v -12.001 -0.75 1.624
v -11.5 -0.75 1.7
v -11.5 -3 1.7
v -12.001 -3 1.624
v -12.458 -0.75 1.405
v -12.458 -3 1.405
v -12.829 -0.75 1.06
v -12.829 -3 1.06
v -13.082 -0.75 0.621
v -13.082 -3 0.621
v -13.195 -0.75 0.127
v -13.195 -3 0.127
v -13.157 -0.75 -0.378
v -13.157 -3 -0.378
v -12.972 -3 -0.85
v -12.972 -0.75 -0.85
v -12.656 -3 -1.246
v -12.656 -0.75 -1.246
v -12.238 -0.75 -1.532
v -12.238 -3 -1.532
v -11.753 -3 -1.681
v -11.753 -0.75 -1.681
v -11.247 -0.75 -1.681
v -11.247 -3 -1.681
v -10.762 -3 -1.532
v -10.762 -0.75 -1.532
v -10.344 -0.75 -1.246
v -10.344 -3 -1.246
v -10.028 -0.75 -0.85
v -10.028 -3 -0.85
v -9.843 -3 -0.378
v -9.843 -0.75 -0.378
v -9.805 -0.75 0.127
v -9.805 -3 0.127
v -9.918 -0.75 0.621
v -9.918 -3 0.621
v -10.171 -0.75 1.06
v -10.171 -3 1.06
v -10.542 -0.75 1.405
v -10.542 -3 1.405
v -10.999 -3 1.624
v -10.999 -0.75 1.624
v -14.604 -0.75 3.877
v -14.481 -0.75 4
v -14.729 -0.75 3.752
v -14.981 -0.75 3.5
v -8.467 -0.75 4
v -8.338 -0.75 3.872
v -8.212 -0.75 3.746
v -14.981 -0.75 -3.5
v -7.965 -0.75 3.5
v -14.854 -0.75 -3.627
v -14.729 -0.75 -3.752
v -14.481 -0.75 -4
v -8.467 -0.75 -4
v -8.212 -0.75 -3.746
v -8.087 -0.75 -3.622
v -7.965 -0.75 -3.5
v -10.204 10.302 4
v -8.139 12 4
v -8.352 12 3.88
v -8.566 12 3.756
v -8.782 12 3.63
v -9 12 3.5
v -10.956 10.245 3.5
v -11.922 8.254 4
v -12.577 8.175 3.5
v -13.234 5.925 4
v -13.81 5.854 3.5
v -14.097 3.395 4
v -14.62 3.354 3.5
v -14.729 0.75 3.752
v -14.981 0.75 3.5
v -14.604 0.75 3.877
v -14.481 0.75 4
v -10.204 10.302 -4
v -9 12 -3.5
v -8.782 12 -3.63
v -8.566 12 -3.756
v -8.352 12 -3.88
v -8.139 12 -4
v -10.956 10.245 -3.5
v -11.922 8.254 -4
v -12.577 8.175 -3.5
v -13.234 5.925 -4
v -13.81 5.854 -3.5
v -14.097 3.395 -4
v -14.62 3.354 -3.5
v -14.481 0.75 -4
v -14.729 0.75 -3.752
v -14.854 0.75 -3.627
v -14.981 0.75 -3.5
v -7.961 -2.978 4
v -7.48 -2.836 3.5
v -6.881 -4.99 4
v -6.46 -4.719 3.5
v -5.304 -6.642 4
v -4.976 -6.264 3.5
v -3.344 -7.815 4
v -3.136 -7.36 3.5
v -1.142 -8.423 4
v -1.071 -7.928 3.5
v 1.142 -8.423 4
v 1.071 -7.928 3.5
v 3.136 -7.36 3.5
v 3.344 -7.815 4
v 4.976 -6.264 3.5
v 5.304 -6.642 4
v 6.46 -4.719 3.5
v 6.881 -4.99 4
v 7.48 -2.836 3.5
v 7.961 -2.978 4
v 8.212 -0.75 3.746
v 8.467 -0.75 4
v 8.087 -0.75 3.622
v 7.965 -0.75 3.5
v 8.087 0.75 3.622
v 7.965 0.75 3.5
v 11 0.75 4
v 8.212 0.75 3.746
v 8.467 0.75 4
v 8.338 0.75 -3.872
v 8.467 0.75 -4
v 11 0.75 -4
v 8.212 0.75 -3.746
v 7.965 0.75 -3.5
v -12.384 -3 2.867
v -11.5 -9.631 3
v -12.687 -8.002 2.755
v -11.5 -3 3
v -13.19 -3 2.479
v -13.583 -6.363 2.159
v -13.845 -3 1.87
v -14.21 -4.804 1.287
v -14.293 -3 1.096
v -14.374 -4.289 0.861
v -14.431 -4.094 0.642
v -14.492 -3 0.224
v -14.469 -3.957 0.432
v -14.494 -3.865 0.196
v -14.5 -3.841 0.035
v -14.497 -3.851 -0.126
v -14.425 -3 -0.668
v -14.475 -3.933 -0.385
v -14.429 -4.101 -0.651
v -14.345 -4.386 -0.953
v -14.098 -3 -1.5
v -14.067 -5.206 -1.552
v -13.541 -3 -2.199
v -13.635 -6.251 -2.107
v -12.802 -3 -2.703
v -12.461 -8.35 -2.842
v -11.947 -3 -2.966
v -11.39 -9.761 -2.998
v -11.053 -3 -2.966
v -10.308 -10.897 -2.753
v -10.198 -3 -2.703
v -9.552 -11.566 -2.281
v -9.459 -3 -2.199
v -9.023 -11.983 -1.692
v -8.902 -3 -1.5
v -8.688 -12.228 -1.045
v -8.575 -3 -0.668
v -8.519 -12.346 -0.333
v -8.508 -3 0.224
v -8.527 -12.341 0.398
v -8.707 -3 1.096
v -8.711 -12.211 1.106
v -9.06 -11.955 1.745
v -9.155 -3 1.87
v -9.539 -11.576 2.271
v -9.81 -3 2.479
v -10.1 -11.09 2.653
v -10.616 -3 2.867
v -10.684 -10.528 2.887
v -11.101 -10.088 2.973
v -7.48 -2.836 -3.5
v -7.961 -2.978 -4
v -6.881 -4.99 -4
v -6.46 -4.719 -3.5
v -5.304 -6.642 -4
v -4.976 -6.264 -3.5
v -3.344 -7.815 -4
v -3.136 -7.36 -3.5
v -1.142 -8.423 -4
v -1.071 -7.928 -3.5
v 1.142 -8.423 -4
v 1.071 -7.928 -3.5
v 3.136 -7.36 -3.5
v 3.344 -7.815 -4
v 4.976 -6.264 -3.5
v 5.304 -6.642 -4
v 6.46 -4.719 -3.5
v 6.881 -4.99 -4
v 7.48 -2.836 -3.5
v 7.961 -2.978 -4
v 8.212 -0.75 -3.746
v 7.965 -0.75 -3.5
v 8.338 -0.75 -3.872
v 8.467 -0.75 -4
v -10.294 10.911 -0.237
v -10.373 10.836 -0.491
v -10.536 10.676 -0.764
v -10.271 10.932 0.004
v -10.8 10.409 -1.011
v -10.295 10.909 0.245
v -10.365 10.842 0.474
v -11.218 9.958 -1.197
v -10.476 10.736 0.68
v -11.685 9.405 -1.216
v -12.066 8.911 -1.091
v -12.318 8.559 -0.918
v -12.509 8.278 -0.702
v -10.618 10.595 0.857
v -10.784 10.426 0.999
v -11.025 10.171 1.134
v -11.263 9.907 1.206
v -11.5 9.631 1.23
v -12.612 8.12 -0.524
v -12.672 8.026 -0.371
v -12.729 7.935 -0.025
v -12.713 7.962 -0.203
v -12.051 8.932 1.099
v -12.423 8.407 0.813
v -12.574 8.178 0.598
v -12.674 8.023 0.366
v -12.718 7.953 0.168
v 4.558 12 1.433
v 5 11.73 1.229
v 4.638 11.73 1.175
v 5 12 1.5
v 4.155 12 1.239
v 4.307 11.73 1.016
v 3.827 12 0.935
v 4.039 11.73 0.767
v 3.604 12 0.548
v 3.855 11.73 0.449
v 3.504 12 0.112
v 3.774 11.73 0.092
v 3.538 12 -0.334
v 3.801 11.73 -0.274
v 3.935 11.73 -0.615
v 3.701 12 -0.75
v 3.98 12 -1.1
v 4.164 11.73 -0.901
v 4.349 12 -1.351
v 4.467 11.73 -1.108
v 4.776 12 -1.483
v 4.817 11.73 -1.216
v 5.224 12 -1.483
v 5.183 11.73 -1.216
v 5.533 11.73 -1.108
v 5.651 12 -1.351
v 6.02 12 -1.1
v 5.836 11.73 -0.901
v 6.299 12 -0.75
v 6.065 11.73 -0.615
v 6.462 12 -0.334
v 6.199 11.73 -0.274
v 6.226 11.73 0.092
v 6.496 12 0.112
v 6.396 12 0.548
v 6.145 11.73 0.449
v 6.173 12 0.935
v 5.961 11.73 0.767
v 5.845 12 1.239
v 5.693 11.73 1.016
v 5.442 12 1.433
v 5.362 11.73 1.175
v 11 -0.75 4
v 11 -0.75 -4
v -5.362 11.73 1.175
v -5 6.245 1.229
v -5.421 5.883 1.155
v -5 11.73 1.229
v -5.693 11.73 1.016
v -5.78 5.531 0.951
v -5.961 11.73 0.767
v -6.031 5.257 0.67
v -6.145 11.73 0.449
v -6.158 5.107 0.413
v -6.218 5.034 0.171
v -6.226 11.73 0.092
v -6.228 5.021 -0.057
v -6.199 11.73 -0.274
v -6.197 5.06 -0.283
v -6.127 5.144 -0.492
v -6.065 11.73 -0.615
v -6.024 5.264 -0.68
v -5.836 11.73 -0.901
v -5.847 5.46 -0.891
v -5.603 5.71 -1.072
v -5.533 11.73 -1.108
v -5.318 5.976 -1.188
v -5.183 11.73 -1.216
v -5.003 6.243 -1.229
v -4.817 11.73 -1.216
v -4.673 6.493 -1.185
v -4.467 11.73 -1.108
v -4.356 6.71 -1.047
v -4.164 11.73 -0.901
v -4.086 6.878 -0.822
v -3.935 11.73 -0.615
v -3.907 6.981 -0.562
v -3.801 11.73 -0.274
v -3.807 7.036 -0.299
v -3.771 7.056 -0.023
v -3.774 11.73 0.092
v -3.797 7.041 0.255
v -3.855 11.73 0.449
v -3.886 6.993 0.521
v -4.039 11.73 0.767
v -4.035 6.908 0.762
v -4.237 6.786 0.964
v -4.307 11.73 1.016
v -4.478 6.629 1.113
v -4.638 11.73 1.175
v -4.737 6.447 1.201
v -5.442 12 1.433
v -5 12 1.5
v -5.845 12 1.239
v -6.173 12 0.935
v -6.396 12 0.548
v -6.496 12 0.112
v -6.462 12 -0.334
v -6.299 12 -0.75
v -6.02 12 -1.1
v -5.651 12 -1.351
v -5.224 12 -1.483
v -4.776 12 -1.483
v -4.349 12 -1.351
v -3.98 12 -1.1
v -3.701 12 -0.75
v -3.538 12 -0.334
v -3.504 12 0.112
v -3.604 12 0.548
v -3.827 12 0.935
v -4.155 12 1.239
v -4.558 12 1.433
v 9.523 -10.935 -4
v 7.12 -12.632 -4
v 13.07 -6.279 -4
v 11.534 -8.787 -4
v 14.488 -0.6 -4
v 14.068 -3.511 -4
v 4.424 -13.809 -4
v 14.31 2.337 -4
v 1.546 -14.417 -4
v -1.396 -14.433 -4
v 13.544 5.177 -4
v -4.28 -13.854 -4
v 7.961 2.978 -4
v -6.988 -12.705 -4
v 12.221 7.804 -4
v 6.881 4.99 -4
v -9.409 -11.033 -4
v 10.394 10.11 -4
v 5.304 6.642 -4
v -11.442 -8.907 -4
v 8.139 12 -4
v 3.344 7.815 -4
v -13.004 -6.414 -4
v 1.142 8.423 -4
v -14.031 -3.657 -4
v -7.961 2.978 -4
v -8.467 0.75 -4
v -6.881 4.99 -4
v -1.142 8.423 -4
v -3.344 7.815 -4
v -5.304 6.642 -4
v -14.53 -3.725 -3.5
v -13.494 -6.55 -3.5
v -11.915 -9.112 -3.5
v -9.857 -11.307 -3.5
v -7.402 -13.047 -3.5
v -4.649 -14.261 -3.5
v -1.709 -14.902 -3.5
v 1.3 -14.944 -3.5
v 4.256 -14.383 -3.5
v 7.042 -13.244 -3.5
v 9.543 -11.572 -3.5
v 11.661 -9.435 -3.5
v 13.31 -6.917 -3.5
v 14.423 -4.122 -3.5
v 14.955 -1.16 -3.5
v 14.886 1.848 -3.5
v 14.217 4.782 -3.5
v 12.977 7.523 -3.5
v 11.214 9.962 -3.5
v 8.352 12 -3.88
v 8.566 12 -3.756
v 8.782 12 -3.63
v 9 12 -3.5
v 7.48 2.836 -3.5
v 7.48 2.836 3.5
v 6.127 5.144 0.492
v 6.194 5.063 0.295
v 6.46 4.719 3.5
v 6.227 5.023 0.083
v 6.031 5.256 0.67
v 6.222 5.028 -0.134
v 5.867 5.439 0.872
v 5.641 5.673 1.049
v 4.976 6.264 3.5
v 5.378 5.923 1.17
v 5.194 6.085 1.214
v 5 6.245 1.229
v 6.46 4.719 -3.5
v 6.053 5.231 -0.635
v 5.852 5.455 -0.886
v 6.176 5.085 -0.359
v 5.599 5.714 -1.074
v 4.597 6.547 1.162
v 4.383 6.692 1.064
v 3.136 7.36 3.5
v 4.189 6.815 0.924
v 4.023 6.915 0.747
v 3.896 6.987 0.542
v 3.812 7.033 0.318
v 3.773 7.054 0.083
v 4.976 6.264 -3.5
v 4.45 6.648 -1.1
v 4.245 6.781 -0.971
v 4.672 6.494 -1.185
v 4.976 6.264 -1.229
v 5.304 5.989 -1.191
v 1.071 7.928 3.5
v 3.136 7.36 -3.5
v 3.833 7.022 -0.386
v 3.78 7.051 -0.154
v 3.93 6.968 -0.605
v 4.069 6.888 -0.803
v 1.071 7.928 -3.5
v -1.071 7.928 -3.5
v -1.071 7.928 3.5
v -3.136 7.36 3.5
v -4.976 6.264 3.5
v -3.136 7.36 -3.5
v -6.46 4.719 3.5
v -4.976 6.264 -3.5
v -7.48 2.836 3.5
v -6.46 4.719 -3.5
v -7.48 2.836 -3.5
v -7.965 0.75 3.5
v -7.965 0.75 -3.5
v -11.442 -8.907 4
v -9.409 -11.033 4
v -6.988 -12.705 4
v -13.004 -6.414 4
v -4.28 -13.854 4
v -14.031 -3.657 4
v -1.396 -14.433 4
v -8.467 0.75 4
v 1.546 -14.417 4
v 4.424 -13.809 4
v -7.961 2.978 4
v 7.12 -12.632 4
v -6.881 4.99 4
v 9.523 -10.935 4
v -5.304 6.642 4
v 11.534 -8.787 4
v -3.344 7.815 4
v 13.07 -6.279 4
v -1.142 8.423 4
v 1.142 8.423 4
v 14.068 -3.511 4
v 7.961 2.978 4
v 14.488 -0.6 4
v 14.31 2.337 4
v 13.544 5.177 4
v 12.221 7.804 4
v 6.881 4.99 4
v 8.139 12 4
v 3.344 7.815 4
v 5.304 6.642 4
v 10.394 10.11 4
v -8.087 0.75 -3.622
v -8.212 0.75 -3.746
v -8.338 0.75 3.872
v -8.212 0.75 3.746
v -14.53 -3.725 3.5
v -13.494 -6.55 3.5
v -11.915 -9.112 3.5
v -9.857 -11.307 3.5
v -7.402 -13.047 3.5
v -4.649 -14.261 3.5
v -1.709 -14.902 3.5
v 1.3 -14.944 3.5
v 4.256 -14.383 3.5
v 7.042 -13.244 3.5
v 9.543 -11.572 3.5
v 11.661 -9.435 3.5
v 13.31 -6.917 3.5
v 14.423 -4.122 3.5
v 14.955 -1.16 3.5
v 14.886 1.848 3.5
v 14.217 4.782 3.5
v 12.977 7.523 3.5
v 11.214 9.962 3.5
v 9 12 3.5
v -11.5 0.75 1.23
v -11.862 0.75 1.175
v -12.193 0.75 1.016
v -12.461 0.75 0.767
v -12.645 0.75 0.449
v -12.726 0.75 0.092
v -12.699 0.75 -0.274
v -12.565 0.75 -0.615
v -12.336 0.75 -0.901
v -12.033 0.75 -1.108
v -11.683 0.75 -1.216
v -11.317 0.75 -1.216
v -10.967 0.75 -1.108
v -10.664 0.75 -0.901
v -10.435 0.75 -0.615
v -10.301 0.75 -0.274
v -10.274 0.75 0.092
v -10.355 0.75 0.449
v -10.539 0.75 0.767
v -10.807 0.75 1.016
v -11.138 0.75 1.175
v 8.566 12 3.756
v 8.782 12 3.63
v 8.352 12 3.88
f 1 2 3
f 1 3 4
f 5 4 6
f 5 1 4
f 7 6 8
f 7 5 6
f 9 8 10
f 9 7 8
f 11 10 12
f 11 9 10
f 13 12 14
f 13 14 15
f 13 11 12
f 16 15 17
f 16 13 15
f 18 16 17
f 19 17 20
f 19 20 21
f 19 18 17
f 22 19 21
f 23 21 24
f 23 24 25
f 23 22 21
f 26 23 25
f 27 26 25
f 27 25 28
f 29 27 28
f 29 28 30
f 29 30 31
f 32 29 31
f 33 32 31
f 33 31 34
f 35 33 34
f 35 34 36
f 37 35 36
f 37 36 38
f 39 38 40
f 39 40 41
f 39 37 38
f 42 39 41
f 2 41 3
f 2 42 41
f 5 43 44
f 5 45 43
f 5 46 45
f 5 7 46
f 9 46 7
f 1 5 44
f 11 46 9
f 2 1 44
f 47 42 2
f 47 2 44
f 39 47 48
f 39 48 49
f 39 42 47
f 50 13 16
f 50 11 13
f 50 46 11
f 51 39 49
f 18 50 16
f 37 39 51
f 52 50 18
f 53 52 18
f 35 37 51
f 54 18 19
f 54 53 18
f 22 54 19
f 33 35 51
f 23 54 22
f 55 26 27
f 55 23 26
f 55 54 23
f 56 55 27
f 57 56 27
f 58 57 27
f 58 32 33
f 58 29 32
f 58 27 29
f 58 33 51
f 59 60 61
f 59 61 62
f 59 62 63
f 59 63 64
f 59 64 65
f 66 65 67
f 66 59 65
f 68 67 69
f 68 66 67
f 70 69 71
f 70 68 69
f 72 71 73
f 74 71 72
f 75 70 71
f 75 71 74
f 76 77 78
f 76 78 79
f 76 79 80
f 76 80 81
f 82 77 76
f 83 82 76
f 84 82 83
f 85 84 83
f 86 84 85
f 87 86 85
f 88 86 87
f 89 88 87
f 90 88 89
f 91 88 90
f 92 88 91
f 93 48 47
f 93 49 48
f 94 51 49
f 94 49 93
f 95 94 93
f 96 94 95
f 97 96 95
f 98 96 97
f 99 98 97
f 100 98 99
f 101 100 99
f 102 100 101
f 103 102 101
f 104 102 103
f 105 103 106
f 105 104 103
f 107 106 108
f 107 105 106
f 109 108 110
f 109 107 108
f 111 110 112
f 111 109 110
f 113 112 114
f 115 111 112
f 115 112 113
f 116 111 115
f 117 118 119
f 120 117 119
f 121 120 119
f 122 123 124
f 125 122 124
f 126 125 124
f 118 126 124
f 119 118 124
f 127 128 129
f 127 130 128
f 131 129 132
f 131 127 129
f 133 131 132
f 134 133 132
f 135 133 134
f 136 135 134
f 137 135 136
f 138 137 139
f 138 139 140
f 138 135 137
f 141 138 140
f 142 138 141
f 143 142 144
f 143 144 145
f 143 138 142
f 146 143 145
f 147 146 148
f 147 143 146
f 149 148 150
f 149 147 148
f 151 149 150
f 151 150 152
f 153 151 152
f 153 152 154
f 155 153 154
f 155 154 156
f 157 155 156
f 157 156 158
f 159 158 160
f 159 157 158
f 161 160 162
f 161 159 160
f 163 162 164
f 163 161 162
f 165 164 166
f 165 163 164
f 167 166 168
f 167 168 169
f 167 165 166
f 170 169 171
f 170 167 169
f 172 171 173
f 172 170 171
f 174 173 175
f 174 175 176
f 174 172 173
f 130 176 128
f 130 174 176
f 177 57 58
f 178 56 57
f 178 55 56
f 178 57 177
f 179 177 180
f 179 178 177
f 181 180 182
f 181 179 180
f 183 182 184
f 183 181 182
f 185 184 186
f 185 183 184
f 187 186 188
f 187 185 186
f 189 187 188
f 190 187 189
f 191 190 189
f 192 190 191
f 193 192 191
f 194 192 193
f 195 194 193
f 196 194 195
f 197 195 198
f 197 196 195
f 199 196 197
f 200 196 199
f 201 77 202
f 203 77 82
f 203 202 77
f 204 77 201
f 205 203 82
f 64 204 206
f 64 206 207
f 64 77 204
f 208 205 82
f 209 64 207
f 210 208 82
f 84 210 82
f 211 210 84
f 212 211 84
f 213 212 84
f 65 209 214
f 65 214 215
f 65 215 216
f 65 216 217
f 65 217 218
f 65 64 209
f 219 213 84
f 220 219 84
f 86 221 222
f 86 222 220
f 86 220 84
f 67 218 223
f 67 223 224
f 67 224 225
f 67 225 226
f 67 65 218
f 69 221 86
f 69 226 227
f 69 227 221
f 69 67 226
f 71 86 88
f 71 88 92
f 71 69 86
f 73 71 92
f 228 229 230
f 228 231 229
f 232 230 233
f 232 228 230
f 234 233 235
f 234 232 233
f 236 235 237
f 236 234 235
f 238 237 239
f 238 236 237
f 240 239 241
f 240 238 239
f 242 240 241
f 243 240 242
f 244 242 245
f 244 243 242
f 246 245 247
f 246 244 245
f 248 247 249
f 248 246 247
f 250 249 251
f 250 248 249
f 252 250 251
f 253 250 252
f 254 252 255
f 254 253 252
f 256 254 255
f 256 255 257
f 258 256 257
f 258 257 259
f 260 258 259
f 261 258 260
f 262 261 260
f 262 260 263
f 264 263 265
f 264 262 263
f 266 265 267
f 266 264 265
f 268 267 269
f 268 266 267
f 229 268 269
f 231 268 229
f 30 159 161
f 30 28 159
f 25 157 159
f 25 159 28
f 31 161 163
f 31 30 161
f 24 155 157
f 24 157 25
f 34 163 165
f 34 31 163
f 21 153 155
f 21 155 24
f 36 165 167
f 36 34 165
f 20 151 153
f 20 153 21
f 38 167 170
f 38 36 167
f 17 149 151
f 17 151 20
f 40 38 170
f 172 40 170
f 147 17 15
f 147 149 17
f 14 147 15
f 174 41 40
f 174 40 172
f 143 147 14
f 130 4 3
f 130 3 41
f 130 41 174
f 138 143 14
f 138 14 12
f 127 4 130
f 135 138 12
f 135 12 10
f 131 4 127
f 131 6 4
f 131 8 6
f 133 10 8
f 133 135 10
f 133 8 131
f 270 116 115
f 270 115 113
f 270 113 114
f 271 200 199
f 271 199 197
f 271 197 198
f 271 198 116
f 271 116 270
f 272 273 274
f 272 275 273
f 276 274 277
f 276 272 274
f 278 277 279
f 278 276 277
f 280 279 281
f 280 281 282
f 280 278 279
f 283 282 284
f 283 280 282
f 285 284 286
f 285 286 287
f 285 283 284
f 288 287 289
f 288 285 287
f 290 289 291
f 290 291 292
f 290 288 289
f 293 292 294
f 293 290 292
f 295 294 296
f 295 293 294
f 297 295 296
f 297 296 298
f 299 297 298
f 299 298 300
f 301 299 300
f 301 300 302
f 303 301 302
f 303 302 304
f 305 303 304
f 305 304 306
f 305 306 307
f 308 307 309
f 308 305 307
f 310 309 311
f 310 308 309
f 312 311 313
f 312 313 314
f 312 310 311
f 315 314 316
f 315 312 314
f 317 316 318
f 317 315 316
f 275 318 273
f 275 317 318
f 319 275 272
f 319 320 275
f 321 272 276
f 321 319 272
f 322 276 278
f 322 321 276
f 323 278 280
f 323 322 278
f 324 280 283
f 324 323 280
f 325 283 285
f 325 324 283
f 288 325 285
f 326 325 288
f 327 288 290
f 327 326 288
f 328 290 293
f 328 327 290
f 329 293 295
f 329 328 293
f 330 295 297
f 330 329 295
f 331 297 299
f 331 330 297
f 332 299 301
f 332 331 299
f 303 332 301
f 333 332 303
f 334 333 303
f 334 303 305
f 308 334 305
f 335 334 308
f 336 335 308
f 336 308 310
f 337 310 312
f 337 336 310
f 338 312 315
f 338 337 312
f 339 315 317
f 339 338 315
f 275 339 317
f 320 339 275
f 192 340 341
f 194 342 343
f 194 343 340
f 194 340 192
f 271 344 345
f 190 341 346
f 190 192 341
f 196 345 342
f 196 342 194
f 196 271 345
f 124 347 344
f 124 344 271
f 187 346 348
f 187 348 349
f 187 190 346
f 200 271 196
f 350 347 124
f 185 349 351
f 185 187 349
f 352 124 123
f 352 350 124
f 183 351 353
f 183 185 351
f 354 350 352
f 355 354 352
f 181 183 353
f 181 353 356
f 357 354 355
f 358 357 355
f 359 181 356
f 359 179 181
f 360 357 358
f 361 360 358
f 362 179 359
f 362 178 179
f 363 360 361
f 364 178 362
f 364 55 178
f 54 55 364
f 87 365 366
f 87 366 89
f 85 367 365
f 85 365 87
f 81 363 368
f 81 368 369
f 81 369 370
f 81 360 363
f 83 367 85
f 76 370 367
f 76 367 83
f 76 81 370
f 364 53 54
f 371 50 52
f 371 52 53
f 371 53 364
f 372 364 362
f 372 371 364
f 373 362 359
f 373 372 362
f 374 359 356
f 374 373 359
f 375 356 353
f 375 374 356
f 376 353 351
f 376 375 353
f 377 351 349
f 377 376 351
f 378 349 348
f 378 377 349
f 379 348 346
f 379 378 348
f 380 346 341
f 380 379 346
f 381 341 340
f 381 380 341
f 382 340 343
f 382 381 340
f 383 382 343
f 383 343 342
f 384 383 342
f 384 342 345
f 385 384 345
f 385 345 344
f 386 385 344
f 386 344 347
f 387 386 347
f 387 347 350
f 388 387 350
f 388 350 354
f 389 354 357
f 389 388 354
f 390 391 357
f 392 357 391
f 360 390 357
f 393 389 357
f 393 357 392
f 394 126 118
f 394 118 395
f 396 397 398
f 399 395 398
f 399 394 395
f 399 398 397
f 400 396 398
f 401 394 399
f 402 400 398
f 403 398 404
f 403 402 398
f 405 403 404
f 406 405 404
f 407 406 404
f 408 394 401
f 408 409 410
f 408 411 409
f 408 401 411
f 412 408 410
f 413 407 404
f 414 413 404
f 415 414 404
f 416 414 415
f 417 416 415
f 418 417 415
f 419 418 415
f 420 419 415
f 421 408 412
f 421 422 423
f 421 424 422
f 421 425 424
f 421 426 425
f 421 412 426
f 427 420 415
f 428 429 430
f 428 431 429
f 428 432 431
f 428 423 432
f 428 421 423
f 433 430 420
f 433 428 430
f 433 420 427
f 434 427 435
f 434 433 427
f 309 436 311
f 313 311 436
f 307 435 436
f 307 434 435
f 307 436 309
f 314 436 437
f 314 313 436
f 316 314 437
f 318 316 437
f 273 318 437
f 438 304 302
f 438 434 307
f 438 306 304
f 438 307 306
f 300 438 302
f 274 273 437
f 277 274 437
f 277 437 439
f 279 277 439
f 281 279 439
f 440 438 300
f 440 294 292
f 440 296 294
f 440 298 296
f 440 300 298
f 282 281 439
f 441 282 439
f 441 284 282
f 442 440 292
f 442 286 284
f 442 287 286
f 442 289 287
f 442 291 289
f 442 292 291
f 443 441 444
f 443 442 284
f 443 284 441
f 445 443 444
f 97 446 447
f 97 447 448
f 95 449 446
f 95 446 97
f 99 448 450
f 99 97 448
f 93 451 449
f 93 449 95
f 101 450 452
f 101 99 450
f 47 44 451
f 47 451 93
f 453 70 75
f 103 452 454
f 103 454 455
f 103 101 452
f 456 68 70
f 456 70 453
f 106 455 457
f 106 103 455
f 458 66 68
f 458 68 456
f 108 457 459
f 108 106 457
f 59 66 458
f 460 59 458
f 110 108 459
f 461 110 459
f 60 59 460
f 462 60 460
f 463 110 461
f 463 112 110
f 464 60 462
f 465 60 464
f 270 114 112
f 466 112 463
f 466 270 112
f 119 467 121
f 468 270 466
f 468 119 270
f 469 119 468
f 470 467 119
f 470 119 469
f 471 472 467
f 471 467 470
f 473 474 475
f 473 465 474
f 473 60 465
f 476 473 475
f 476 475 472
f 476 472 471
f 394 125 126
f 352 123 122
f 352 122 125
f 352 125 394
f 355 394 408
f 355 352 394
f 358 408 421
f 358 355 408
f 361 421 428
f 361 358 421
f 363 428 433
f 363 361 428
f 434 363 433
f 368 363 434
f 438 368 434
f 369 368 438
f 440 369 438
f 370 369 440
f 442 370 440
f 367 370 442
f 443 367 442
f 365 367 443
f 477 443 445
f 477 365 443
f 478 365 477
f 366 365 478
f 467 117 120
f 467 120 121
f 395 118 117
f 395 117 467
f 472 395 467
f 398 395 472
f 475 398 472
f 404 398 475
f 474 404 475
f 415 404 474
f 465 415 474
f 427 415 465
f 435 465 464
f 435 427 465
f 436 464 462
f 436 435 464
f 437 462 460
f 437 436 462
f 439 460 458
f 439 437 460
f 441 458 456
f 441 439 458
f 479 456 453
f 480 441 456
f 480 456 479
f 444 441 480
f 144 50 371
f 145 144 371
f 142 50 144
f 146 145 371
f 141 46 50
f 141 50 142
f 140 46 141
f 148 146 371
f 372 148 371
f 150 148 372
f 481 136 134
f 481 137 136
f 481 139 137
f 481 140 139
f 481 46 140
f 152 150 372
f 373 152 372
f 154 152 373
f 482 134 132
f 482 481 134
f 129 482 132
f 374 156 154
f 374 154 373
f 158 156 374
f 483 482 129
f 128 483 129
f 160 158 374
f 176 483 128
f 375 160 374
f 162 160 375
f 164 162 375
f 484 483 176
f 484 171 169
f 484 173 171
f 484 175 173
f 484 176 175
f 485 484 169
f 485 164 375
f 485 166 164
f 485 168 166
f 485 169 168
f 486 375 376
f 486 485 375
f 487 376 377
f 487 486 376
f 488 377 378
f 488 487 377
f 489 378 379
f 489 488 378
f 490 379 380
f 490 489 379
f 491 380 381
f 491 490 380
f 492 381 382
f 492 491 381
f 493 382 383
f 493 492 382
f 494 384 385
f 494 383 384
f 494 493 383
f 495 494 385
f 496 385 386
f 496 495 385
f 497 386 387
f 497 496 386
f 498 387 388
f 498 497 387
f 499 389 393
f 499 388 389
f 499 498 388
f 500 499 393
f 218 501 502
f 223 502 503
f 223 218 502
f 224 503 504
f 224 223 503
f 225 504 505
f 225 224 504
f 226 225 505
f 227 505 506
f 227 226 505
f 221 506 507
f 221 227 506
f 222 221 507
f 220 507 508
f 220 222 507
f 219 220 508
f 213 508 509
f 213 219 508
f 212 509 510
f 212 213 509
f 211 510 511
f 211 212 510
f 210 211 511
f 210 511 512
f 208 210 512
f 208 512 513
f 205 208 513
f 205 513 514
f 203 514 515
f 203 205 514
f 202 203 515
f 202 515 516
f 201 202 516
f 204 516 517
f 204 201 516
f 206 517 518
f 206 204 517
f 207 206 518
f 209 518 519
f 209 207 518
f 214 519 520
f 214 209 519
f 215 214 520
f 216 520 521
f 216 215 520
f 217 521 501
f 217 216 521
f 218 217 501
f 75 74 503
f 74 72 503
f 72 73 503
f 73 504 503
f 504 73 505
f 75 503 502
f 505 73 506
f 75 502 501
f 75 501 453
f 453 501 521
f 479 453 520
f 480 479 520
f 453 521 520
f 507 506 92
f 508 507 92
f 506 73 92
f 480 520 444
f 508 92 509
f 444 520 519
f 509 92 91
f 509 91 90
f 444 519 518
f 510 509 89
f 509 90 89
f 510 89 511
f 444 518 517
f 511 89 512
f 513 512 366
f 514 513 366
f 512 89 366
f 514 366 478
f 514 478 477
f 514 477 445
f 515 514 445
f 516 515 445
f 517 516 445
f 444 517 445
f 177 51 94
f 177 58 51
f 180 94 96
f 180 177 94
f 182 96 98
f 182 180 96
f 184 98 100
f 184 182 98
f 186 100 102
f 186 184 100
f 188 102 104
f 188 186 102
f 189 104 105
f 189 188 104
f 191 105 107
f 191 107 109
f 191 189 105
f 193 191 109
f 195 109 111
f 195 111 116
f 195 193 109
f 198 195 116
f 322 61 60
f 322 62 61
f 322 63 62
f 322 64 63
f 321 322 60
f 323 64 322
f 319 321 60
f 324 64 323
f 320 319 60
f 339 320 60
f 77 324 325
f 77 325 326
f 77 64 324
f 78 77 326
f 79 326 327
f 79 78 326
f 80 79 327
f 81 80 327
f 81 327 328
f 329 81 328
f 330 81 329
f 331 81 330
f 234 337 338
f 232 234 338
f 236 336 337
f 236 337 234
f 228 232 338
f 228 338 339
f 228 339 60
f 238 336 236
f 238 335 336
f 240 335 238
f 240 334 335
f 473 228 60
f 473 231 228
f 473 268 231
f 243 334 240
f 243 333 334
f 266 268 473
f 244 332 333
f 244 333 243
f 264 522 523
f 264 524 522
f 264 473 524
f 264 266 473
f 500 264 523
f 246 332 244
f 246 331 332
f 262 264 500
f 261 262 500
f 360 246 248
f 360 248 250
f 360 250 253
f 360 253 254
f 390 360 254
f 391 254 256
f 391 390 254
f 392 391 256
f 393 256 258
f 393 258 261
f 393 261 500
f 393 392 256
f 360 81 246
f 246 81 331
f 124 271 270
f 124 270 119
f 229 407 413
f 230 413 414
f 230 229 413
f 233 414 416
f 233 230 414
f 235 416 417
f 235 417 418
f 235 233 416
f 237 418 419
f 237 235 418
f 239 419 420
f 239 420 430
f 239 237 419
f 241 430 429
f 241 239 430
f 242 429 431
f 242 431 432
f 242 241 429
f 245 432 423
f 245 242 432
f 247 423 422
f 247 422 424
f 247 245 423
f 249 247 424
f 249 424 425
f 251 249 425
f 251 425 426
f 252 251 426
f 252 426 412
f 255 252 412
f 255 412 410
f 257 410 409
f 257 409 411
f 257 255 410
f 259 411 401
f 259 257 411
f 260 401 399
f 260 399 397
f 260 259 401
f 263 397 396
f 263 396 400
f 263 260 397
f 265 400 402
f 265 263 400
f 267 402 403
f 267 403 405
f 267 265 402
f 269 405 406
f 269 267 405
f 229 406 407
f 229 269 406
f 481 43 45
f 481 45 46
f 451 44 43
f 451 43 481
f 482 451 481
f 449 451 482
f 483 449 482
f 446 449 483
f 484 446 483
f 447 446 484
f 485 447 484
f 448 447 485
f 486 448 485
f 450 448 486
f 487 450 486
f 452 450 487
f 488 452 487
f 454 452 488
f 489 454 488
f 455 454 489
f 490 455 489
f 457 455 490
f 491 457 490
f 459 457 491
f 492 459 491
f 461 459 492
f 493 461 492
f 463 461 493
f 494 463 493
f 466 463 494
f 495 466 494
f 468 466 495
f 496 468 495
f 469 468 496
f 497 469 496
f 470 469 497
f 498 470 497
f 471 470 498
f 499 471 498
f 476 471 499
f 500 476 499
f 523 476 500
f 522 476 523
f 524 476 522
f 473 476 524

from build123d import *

# Parameters (mm, degrees)
CUT_EXTRUDE1_DEPTH      = 4
CUT_EXTRUDE1_DEPTH_BACK = 4
SKETCH2_W               = 41
SKETCH2_H               = 1.5
SKETCH4_W               = 1.2295
SKETCH4_H               = 15
CUT_EXTRUDE2_DEPTH      = 8
CUT_EXTRUDE2_DEPTH_BACK = 8
SKETCH5_W               = 30
SKETCH5_H               = 3.75


with BuildPart() as part:
    # Sketch1 → Revolve1 (revolve)
    with BuildSketch(Plane(origin=(0, 0, 0), x_dir=(0, 0, -1), z_dir=(1, 0, 0))):
        Polygon((-4, 8.5), (-3.5, 8), (3.5, 8), (4, 8.5), (4, 14.5), (3.5, 15), (-3.5, 15), (-4, 14.5), align=None)
    revolve(axis=Axis((0, 0, -4), (0, 0, 1)))

    # Sketch2 → Cut-Extrude1 (cut, two sides: drawn at the far end of the back side and taken through both)
    with BuildSketch(Plane.XY.offset(-CUT_EXTRUDE1_DEPTH_BACK)):
        with Locations((-9.5, 0)):
            Rectangle(SKETCH2_W, SKETCH2_H)
    extrude(amount=CUT_EXTRUDE1_DEPTH + CUT_EXTRUDE1_DEPTH_BACK, mode=Mode.SUBTRACT)

    # Sketch3 → Cut-Revolve1 (revolve, cut)
    with BuildSketch(Plane.XY):
        Polygon((-11.5, -15), (-14.5, -15), (-14.5, -3), (-13.2, -3), (-13.2, 0), (-11.5, 0), align=None)
    revolve(axis=Axis((-11.5, 0, 0), (0, -1, 0)), mode=Mode.SUBTRACT)

    # Sketch4 → Cut-Revolve2 (revolve, cut)
    with BuildSketch(Plane.XY):
        with Locations((-12.11475, 8.25)):
            Rectangle(SKETCH4_W, SKETCH4_H)
    revolve(axis=Axis((-11.5, 15.75, 0), (0, -1, 0)), mode=Mode.SUBTRACT)

    # Sketch5 → Cut-Extrude2 (cut, two sides: drawn at the far end of the back side and taken through both)
    with BuildSketch(Plane.XY.offset(-CUT_EXTRUDE2_DEPTH_BACK)):
        with Locations((0, 13.875)):
            Rectangle(SKETCH5_W, SKETCH5_H)
    extrude(amount=CUT_EXTRUDE2_DEPTH + CUT_EXTRUDE2_DEPTH_BACK, mode=Mode.SUBTRACT)

    # Sketch6 → Cut-Revolve3 (revolve, cut)
    with BuildSketch(Plane.XY):
        Polygon((-5, 2.333333333), (-6.2295, 2.333333333), (-6.2295, 11.7295), (-6.5, 12), (-5, 12), align=None)
    revolve(axis=Axis((-5, 12, 0), (0, -1, 0)), mode=Mode.SUBTRACT)

    # Sketch7 → Cut-Revolve4 (revolve, cut)
    with BuildSketch(Plane.XY):
        Polygon((5, 2.333333333), (3.7705, 2.333333333), (3.7705, 11.7295), (3.5, 12), (5, 12), align=None)
    revolve(axis=Axis((5, 12, 0), (0, -1, 0)), mode=Mode.SUBTRACT)


solid = part.part
